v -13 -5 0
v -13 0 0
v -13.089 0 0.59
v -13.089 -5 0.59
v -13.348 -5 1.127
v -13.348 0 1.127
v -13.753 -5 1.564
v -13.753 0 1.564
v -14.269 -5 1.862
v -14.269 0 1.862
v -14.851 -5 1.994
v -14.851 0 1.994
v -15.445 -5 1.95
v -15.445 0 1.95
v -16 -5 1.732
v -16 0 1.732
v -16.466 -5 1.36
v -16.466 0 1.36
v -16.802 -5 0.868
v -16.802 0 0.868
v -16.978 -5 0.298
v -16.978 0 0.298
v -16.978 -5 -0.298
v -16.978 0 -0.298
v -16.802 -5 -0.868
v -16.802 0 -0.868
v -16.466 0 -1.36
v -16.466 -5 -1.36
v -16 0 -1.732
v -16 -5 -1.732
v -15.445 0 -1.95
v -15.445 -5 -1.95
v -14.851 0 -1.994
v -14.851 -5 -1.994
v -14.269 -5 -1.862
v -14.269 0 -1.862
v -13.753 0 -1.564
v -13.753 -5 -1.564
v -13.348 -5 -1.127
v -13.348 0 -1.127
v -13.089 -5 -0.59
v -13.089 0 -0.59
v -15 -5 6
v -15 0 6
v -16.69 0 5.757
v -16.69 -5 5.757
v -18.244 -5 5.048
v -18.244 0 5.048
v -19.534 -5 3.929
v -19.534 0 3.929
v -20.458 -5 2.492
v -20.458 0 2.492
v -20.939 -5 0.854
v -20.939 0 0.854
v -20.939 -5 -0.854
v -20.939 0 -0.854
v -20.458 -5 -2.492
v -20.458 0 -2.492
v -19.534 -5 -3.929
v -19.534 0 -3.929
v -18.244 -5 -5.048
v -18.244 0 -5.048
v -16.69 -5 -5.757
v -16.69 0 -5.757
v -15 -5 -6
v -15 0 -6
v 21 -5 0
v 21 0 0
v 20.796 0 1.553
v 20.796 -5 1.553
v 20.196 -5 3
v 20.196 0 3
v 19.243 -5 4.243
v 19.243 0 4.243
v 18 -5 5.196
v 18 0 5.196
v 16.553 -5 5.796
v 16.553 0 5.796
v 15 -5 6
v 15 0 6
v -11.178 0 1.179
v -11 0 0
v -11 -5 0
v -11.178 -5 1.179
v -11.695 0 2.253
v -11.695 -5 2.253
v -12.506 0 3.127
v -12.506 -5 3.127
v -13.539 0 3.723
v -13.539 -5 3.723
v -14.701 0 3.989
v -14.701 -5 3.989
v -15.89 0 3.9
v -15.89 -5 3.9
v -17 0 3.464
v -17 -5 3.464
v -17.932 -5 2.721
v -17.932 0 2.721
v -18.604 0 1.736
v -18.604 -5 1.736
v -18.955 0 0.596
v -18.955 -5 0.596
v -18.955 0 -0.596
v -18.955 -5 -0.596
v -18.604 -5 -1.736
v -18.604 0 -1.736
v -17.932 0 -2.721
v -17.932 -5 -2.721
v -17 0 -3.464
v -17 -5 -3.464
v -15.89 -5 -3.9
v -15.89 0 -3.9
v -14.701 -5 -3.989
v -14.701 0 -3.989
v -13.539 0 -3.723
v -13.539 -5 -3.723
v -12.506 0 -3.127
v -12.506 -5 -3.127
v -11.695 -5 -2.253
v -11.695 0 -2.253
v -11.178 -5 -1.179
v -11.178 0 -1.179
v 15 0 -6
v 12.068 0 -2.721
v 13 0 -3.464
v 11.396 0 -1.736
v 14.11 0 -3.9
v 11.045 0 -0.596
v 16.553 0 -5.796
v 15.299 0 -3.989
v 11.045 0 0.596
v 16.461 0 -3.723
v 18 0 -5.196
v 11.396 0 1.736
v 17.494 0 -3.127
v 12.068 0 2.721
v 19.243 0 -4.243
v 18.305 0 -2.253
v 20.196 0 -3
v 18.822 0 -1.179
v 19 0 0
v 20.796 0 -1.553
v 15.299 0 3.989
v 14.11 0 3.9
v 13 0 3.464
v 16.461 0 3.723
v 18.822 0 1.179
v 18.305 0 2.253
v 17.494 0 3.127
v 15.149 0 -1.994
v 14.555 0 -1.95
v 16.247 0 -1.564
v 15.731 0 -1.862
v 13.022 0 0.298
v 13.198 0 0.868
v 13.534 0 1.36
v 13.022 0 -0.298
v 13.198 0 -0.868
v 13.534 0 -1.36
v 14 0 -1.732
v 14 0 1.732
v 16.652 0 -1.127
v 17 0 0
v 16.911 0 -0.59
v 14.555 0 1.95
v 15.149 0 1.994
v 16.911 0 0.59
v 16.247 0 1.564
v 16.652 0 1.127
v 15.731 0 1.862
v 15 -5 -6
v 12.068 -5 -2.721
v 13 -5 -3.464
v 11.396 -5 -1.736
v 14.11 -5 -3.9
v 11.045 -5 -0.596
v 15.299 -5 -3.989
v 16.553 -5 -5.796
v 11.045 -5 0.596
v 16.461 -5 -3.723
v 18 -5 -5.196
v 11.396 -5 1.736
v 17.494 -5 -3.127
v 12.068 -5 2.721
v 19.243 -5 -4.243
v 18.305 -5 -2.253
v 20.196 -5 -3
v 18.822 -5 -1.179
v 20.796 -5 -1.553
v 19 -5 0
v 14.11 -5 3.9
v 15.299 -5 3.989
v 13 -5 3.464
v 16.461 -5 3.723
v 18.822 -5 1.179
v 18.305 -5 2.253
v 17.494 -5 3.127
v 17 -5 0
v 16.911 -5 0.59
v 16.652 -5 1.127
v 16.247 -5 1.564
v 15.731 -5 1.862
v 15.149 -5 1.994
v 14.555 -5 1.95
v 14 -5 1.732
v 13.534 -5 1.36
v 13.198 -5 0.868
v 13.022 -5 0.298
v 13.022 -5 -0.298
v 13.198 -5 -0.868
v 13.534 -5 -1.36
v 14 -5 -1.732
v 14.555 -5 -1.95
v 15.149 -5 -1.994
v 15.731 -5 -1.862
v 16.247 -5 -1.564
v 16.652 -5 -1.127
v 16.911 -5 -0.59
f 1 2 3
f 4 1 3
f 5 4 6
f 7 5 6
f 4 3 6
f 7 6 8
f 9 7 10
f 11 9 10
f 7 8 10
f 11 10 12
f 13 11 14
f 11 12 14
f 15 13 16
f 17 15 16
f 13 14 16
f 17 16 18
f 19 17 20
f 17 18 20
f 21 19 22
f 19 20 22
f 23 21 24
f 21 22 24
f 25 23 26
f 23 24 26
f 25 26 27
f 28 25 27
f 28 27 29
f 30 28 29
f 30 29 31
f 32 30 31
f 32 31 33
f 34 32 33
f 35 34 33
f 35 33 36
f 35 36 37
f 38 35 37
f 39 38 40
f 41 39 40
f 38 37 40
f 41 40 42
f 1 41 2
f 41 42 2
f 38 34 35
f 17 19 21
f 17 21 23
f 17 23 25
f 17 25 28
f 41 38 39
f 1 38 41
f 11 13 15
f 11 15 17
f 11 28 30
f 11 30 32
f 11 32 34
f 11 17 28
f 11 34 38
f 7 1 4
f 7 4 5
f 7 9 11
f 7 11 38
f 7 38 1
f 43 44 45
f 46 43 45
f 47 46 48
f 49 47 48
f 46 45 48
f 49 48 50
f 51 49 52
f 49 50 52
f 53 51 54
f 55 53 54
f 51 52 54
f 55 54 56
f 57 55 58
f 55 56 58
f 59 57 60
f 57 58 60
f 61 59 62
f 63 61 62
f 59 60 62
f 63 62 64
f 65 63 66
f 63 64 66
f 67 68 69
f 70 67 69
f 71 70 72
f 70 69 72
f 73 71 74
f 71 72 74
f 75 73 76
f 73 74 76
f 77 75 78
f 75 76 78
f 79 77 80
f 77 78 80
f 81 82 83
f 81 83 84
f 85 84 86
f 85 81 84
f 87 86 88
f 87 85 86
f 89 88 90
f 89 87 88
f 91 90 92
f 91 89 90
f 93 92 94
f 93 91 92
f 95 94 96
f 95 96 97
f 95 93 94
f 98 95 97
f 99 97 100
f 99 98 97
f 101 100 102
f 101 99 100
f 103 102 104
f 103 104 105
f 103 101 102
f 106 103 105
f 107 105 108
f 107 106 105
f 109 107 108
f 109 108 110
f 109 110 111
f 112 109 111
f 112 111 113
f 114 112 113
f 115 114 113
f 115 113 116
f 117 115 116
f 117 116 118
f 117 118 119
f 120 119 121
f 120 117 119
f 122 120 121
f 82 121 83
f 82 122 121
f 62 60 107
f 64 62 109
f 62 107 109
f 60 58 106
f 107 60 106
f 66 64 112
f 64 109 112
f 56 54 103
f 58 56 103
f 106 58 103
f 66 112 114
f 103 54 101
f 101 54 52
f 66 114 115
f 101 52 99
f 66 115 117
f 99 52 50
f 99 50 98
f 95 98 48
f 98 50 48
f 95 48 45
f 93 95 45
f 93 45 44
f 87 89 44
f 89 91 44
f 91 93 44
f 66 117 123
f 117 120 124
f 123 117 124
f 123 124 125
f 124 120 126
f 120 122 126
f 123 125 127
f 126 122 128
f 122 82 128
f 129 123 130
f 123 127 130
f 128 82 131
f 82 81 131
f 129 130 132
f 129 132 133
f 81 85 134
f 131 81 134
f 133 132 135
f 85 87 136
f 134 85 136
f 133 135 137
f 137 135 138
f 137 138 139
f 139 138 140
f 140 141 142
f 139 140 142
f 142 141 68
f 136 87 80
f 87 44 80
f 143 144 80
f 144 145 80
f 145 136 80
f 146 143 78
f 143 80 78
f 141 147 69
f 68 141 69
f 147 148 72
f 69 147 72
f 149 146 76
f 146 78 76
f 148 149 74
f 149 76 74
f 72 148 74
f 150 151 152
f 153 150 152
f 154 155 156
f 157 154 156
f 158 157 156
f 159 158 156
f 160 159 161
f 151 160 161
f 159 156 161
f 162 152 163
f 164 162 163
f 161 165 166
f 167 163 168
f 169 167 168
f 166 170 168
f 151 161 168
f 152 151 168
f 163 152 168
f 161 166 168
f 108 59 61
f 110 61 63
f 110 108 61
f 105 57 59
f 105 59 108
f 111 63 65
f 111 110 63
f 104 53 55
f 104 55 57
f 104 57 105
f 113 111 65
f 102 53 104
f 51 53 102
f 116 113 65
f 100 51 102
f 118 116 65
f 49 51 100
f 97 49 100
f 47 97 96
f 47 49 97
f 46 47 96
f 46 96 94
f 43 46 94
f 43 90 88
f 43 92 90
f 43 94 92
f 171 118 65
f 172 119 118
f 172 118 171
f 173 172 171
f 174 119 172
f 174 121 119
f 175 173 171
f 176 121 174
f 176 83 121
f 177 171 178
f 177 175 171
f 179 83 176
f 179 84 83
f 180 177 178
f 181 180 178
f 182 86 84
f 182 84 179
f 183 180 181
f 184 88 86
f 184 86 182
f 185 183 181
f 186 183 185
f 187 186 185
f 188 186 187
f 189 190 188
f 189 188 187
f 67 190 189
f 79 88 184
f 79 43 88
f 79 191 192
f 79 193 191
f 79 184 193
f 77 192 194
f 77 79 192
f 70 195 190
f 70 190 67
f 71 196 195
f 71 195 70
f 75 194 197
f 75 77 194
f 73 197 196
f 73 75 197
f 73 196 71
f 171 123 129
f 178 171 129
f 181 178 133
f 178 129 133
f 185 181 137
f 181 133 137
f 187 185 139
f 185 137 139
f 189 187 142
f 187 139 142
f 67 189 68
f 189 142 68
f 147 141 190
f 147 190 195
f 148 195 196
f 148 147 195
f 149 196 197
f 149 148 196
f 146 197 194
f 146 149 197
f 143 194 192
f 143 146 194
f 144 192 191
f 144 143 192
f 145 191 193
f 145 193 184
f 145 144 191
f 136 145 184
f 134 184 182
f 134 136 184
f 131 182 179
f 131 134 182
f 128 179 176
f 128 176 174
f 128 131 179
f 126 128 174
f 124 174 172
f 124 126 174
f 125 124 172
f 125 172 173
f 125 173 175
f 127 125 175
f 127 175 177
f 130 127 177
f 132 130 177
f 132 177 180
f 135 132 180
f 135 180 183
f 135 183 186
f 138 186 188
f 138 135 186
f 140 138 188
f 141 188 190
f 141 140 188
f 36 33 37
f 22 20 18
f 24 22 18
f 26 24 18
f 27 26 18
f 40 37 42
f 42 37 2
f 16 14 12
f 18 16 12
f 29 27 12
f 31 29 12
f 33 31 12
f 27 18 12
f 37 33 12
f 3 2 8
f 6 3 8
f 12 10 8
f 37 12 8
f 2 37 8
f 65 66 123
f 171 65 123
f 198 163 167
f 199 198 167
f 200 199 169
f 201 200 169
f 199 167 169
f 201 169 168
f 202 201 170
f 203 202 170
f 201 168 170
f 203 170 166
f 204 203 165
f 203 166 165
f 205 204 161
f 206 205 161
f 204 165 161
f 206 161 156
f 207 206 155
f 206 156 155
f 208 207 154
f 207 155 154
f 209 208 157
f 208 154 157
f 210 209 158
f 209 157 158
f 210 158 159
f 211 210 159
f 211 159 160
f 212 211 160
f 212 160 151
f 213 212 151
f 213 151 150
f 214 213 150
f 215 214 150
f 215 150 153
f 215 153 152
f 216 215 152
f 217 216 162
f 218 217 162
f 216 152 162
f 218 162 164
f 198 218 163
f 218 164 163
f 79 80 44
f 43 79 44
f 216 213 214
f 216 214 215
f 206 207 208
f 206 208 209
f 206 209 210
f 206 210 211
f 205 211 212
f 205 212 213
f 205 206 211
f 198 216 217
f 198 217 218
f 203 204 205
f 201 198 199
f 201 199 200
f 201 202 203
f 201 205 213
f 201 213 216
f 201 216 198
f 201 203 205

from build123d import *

# Parameters (mm, degrees)
F0_R     = 4
F1_DEPTH = 5
F0_R_2   = 2


with BuildPart() as f1:
    # F0 (on Front) → F1 (new body)
    with BuildSketch(Plane.XZ):
        with BuildLine():
            ThreePointArc((-15, 6), (-10.7573593129, 4.2426406871), (-9, 0))
            ThreePointArc((-9, 0), (-10.7573593129, -4.2426406871), (-15, -6))
            Line((-15, -6), (0, -6))
            Line((0, -6), (15, -6))
            ThreePointArc((15, -6), (9, 0), (15, 6))
            Line((15, 6), (0, 6))
            Line((0, 6), (-15, 6))
        make_face()
        with BuildLine():
            ThreePointArc((-15, -6), (-10.7573593129, -4.2426406871), (-9, 0))
            ThreePointArc((-9, 0), (-10.7573593129, 4.2426406871), (-15, 6))
            ThreePointArc((-15, 6), (-21, 0), (-15, -6))
        make_face()
        with Locations((-15, 0)):
            Circle(F0_R, mode=Mode.SUBTRACT)
        with BuildLine():
            ThreePointArc((21, 0), (19.2426406871, 4.2426406871), (15, 6))
            ThreePointArc((15, 6), (9, 0), (15, -6))
            ThreePointArc((15, -6), (19.2426406871, -4.2426406871), (21, 0))
        make_face()
        with Locations((15, 0)):
            Circle(F0_R, mode=Mode.SUBTRACT)
    extrude(amount=F1_DEPTH)


with BuildPart() as f1b:
    # F0 (on Front) → F1, piece 2 (new body)
    with BuildSketch(Plane.XZ):
        with Locations((-15, 0)):
            Circle(F0_R_2)
    extrude(amount=F1_DEPTH)


with BuildPart() as f1c:
    # F0 (on Front) → F1, piece 3 (new body)
    with BuildSketch(Plane.XZ):
        with Locations((15, 0)):
            Circle(F0_R_2)
    extrude(amount=F1_DEPTH)


solid = Compound([f1.part, f1b.part, f1c.part])
